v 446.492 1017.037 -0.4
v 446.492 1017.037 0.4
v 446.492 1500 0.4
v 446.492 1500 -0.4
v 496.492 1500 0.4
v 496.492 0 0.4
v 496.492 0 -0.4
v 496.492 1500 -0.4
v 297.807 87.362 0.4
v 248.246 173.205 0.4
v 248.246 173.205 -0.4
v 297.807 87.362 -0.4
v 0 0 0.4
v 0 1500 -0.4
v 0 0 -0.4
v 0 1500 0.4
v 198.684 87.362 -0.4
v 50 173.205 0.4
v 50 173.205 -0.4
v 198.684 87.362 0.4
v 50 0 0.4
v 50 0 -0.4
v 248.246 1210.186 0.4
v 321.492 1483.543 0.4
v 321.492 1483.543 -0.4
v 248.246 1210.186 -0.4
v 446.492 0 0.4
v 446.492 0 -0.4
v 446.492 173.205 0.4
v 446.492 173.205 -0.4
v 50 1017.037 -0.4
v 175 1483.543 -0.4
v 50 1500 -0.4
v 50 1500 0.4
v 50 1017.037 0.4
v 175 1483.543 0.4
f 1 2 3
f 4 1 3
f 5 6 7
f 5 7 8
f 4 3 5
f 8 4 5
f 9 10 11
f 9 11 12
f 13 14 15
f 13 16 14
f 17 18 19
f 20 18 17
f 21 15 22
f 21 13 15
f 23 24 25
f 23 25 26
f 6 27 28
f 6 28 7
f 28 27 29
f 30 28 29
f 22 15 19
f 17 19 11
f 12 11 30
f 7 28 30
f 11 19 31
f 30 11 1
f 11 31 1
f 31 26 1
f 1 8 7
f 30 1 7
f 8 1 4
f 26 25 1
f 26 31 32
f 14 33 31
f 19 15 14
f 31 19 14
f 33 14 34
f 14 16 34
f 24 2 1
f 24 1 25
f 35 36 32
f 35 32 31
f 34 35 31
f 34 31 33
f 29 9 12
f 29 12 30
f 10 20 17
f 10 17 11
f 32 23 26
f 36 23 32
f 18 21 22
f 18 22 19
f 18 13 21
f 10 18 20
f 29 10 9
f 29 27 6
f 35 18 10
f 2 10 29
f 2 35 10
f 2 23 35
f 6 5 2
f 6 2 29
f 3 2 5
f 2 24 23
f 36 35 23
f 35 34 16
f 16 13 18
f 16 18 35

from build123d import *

# Parameters (mm, degrees)
F0_W     = 50
F0_H     = 173.205
F0_H_2   = 843.832
F0_H_3   = 482.963
F1_DEPTH = 0.4


with BuildPart() as f1:
    # F0 (on Top) → F1 (new body, symmetric)
    with BuildSketch(Plane.XY):
        with Locations((25, 86.6025)):
            Rectangle(F0_W, F0_H)
        with Locations((25, 595.121)):
            Rectangle(F0_W, F0_H_2)
        Polygon((50, 1017.037), (50, 173.205), (248.2458122439, 173.205), (248.2458122439, 1210.1864260022), align=None)
        Polygon((248.2458122439, 173.205), (50, 173.205), (198.6843591829, 87.3620452015), align=None)
        with Locations((25, 1258.5185)):
            Rectangle(F0_W, F0_H_3)
        Polygon((175.0000224798, 1483.543434842), (50, 1017.037), (248.2458122439, 1210.1864260022), align=None)
        Polygon((446.4916244877, 173.205), (248.2458122439, 173.205), (297.8072653048, 87.3620452015), align=None)
        Polygon((248.2458122439, 1210.1864260022), (248.2458122439, 173.205), (446.4916244877, 173.205), (446.4916244877, 1017.037), align=None)
        Polygon((321.4916020079, 1483.543434842), (248.2458122439, 1210.1864260022), (446.4916244877, 1017.037), align=None)
        with Locations((471.4916244877, 595.121)):
            Rectangle(F0_W, F0_H_2)
        with Locations((471.4916244877, 86.6025)):
            Rectangle(F0_W, F0_H)
        with Locations((471.4916244877, 1258.5185)):
            Rectangle(F0_W, F0_H_3)
    extrude(amount=F1_DEPTH, both=True)


solid = f1.part
